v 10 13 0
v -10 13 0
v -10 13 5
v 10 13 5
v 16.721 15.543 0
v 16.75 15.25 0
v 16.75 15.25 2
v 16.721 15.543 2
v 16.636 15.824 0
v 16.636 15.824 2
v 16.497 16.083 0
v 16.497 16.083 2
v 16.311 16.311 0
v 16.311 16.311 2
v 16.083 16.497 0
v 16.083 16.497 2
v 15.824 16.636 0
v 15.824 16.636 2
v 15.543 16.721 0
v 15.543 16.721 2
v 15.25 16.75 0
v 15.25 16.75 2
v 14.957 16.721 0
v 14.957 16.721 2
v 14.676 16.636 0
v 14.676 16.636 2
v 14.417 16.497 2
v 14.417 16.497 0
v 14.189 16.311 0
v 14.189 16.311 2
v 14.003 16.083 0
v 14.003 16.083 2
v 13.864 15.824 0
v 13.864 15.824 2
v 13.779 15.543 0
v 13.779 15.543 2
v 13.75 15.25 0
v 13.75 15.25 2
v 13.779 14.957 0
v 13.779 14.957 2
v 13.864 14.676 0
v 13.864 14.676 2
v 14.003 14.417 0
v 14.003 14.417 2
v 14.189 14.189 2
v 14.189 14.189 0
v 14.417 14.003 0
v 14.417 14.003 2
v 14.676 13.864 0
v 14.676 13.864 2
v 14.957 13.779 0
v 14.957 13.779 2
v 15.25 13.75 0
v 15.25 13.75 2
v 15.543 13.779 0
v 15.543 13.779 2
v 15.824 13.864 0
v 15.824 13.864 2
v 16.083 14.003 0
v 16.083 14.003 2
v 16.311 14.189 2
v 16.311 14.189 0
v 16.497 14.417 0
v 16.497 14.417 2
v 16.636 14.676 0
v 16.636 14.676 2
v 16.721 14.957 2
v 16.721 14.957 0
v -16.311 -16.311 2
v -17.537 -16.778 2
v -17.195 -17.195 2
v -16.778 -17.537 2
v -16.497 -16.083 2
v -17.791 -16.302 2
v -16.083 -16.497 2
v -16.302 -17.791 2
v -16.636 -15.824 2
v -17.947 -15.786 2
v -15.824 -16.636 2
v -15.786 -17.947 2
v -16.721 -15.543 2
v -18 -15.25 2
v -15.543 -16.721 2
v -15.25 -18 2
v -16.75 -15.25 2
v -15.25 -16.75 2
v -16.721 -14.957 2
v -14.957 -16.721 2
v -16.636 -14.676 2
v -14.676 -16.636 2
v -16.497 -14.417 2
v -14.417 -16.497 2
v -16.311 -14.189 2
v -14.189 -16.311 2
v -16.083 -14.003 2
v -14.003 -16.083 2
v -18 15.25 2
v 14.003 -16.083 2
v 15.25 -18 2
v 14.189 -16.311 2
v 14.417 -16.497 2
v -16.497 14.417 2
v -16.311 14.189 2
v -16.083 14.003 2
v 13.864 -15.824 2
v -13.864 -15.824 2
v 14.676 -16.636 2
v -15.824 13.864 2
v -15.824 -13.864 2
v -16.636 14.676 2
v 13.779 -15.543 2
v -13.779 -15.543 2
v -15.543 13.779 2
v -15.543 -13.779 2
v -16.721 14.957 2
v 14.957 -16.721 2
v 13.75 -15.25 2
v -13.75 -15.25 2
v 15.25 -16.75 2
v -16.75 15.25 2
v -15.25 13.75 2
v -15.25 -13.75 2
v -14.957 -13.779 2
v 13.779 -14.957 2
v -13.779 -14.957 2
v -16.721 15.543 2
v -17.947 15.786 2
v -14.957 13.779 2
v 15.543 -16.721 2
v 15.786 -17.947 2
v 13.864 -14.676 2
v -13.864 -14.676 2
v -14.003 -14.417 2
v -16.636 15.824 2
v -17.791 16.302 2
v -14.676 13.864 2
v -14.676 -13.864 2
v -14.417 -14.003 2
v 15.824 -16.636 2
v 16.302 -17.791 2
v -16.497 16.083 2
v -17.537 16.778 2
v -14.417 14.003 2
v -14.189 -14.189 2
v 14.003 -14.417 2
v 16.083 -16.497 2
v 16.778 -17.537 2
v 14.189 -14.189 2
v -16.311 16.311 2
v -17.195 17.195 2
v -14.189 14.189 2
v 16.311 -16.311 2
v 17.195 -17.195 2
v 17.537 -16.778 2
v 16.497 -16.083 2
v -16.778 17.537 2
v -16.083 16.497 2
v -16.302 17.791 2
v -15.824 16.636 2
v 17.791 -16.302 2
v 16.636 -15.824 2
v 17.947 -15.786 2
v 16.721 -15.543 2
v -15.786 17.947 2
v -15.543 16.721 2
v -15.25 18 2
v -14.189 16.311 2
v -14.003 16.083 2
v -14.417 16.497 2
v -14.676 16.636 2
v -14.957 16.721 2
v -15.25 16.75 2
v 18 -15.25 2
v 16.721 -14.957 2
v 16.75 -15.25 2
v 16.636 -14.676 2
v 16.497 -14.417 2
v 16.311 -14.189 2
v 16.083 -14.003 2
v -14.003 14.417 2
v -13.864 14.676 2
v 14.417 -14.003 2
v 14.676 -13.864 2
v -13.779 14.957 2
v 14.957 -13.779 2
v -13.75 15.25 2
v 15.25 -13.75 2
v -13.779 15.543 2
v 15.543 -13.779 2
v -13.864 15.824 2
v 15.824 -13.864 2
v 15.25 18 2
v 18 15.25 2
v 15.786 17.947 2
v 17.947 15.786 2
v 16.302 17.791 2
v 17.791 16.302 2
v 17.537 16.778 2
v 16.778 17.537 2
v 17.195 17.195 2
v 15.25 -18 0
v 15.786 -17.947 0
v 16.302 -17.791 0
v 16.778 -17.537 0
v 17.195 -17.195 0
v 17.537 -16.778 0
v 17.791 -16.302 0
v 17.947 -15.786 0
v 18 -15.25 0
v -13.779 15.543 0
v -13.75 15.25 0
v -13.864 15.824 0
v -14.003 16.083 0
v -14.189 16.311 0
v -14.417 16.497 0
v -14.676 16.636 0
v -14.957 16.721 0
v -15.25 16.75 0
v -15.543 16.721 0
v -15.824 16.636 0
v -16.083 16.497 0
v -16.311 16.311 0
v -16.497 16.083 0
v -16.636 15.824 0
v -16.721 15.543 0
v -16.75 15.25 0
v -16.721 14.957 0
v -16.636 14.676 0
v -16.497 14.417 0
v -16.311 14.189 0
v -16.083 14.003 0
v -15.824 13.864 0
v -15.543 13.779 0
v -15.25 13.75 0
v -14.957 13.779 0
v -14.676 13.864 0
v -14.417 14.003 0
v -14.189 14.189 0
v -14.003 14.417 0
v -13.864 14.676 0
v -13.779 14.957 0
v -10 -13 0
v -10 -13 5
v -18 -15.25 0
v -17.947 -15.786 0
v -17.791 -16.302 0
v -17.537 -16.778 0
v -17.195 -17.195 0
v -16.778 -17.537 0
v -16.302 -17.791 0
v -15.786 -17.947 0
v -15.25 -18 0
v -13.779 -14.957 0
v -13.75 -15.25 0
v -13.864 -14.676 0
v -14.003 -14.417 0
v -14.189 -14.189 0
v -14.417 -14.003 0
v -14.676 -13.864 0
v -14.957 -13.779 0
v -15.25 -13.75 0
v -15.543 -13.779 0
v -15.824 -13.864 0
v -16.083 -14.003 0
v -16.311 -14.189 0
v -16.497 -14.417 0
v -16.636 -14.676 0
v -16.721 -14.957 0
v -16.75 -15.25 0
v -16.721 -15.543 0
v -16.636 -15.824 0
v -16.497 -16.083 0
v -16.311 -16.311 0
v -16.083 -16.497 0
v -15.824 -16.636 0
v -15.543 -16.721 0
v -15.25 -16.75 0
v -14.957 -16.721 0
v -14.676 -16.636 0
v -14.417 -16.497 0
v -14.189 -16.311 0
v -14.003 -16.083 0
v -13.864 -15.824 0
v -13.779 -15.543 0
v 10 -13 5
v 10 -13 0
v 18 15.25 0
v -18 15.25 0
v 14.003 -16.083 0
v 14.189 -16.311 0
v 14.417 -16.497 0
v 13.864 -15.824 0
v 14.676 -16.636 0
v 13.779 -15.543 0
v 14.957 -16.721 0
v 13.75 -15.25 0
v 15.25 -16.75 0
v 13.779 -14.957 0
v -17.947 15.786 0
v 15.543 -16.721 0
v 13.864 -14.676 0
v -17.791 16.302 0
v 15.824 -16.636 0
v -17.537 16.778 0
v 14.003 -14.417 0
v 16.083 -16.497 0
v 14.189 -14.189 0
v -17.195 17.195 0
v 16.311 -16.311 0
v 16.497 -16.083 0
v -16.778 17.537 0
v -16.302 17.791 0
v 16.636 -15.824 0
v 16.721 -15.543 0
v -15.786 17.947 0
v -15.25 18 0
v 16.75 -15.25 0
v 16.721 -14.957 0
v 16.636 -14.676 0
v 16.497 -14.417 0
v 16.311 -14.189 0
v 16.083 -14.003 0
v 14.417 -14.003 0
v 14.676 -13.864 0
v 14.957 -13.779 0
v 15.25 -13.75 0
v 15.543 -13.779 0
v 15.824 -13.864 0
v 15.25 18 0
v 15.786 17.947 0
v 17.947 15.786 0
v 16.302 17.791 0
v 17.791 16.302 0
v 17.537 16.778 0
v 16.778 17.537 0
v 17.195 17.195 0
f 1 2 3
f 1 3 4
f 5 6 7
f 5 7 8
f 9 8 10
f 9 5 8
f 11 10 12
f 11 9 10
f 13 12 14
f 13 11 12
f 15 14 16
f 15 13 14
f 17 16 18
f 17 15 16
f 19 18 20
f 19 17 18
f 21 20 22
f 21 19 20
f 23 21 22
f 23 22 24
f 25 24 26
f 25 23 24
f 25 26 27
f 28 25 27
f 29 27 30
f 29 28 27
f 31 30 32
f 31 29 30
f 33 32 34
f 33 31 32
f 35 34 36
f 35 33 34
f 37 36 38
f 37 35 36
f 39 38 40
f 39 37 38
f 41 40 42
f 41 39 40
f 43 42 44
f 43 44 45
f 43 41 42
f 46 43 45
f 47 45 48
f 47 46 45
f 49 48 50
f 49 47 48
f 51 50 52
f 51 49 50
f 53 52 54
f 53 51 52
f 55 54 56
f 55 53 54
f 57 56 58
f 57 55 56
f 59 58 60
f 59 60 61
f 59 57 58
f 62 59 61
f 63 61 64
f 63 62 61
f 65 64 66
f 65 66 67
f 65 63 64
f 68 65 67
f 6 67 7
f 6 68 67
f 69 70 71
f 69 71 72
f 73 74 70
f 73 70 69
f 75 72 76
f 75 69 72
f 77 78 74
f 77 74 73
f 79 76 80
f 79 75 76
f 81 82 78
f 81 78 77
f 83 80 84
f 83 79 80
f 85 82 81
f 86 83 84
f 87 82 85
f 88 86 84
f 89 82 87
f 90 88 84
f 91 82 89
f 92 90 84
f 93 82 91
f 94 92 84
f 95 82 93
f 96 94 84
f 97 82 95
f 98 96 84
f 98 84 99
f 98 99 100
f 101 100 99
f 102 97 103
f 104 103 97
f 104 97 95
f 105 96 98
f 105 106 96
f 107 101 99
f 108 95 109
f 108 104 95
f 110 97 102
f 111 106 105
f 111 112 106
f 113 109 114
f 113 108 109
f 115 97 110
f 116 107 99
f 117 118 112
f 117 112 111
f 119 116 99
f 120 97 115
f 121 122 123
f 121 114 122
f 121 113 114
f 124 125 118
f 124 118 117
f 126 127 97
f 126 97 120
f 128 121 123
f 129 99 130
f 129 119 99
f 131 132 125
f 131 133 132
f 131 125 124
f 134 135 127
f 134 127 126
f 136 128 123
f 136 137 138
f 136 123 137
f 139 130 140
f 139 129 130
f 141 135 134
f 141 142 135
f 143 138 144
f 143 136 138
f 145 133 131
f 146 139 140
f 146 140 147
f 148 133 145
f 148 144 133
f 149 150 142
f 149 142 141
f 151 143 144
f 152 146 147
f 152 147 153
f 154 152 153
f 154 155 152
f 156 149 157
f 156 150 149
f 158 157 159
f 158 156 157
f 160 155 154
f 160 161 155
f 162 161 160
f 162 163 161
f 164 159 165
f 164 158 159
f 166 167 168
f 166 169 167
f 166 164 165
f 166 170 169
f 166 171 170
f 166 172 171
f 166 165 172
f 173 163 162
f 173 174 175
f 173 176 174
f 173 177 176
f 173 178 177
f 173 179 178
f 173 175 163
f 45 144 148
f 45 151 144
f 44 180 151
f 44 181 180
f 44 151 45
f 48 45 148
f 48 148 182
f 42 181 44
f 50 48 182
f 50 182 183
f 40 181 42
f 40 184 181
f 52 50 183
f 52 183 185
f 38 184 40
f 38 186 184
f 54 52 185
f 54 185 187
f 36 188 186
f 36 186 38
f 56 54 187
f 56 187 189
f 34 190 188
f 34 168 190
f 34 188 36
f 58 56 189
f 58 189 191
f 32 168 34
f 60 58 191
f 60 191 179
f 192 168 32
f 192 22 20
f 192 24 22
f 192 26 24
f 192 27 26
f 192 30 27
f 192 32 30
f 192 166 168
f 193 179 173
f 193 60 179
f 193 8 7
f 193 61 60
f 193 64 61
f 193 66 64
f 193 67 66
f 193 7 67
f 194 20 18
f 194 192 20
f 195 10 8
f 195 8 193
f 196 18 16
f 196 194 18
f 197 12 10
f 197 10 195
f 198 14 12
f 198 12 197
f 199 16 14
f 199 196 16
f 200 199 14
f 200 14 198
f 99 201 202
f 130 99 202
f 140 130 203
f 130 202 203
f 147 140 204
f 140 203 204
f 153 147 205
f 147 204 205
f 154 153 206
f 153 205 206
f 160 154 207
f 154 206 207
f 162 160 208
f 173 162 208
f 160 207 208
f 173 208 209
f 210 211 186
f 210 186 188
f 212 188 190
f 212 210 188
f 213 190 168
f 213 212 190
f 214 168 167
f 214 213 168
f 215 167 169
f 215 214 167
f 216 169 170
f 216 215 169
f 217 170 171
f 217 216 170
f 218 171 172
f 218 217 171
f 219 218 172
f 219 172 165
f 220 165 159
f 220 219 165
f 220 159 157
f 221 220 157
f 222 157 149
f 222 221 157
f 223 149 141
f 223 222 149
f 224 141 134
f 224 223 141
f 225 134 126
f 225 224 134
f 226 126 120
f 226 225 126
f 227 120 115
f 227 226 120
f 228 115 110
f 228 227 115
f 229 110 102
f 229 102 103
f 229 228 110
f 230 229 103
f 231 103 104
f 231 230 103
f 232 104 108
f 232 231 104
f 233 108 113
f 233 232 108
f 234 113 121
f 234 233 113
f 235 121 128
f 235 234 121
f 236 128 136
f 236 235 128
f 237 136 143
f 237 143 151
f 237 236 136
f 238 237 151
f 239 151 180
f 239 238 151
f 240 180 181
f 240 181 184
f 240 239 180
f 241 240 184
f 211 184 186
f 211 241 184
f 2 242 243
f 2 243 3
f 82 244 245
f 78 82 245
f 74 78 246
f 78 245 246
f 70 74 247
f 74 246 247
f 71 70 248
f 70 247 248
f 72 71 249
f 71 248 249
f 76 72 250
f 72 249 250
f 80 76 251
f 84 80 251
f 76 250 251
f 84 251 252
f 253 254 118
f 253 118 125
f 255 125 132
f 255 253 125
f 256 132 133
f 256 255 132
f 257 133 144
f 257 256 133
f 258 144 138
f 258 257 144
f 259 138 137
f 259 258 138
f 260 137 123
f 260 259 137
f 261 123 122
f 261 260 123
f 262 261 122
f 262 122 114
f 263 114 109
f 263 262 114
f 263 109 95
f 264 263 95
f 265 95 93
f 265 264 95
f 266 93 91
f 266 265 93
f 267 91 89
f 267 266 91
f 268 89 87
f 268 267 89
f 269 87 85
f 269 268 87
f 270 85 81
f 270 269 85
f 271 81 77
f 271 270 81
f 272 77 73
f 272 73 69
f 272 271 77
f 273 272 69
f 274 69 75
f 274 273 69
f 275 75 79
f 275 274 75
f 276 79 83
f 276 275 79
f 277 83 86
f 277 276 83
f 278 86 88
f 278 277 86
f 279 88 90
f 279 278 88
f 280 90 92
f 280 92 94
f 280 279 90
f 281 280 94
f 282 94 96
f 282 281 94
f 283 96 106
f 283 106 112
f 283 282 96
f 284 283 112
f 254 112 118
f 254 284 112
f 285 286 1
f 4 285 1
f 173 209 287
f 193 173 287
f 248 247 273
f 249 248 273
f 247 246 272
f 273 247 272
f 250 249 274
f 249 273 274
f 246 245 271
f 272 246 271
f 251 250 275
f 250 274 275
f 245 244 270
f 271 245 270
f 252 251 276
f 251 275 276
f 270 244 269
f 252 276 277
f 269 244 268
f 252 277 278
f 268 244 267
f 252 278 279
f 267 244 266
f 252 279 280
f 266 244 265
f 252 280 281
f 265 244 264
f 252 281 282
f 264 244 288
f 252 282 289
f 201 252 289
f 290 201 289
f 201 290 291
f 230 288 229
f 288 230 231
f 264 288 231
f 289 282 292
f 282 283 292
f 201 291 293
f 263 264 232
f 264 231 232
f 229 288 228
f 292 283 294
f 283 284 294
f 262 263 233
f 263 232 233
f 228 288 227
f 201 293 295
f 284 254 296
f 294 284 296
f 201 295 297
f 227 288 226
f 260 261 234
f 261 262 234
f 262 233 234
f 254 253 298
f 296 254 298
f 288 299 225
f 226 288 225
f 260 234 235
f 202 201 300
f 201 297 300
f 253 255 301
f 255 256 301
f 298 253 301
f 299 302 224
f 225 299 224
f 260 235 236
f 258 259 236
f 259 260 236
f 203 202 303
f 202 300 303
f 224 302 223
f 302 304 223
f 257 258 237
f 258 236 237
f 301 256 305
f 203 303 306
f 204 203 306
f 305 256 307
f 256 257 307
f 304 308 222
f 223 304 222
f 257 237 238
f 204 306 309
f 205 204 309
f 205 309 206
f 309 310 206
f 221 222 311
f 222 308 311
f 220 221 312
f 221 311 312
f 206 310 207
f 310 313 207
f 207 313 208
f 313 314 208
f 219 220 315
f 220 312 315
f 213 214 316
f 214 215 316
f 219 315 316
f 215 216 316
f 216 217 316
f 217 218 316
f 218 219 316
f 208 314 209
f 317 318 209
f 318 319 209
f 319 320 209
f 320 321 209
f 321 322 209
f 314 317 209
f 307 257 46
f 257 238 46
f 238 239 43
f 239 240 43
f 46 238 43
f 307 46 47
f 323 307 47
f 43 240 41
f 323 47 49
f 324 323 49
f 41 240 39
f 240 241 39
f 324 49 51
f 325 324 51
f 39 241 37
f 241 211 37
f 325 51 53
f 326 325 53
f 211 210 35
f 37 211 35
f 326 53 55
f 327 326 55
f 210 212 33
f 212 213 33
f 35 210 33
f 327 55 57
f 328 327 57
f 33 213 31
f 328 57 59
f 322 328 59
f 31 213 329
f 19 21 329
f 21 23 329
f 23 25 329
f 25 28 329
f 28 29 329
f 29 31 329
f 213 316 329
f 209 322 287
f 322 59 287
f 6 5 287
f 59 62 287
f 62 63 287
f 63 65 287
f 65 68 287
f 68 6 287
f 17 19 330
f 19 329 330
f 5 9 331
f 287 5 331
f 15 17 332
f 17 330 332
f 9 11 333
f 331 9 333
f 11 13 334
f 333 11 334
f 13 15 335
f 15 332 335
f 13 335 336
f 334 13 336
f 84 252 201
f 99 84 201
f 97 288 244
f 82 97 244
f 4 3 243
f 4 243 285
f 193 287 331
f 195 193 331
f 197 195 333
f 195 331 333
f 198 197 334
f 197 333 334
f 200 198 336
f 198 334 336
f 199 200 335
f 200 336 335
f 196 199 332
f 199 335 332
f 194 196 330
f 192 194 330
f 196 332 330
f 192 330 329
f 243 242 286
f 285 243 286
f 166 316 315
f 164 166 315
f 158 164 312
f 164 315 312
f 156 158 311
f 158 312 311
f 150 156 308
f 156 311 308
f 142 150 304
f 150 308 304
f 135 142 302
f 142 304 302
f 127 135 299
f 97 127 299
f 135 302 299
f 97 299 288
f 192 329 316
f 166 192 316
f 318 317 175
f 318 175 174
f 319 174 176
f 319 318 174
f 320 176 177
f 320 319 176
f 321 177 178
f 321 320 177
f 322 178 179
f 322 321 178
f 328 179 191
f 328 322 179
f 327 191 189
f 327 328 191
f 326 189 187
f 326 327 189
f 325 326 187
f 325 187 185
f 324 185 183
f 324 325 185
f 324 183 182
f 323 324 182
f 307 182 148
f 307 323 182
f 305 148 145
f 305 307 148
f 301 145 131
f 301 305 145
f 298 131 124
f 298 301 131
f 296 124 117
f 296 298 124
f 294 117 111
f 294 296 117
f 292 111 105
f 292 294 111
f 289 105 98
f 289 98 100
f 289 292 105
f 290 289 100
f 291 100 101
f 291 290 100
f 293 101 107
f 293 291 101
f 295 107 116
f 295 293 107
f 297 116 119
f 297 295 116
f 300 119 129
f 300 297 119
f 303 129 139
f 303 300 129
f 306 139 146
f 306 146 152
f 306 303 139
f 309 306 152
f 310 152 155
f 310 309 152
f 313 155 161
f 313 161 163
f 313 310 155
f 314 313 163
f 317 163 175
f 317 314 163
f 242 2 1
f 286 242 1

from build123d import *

# Parameters (mm, degrees)
F0_R     = 1.5
F1_DEPTH = 2
F2_W     = 20
F2_H     = 26
F3_DEPTH = 5


with BuildPart() as f1:
    # F0 (on Top) → F1 (new body)
    with BuildSketch(Plane.XY):
        with BuildLine():
            Line((15.25, 18), (-15.25, 18))
            ThreePointArc((-15.25, 18), (-17.194544, 17.194544), (-18, 15.25))
            Line((-18, 15.25), (-18, -15.25))
            ThreePointArc((-18, -15.25), (-17.194544, -17.194544), (-15.25, -18))
            Line((-15.25, -18), (15.25, -18))
            ThreePointArc((15.25, -18), (17.194544, -17.194544), (18, -15.25))
            Line((18, -15.25), (18, 15.25))
            ThreePointArc((18, 15.25), (17.194544, 17.194544), (15.25, 18))
        make_face()
        with Locations((-15.25, -15.25)):
            Circle(F0_R, mode=Mode.SUBTRACT)
        with Locations((15.25, -15.25)):
            Circle(F0_R, mode=Mode.SUBTRACT)
        with Locations((-15.25, 15.25)):
            Circle(F0_R, mode=Mode.SUBTRACT)
        with Locations((15.25, 15.25)):
            Circle(F0_R, mode=Mode.SUBTRACT)
    extrude(amount=F1_DEPTH)


with BuildPart() as f3:
    # F2 (on Top) → F3 (new body)
    with BuildSketch(Plane.XY):
        Rectangle(F2_W, F2_H)
    extrude(amount=F3_DEPTH)


solid = Compound([f1.part, f3.part])
